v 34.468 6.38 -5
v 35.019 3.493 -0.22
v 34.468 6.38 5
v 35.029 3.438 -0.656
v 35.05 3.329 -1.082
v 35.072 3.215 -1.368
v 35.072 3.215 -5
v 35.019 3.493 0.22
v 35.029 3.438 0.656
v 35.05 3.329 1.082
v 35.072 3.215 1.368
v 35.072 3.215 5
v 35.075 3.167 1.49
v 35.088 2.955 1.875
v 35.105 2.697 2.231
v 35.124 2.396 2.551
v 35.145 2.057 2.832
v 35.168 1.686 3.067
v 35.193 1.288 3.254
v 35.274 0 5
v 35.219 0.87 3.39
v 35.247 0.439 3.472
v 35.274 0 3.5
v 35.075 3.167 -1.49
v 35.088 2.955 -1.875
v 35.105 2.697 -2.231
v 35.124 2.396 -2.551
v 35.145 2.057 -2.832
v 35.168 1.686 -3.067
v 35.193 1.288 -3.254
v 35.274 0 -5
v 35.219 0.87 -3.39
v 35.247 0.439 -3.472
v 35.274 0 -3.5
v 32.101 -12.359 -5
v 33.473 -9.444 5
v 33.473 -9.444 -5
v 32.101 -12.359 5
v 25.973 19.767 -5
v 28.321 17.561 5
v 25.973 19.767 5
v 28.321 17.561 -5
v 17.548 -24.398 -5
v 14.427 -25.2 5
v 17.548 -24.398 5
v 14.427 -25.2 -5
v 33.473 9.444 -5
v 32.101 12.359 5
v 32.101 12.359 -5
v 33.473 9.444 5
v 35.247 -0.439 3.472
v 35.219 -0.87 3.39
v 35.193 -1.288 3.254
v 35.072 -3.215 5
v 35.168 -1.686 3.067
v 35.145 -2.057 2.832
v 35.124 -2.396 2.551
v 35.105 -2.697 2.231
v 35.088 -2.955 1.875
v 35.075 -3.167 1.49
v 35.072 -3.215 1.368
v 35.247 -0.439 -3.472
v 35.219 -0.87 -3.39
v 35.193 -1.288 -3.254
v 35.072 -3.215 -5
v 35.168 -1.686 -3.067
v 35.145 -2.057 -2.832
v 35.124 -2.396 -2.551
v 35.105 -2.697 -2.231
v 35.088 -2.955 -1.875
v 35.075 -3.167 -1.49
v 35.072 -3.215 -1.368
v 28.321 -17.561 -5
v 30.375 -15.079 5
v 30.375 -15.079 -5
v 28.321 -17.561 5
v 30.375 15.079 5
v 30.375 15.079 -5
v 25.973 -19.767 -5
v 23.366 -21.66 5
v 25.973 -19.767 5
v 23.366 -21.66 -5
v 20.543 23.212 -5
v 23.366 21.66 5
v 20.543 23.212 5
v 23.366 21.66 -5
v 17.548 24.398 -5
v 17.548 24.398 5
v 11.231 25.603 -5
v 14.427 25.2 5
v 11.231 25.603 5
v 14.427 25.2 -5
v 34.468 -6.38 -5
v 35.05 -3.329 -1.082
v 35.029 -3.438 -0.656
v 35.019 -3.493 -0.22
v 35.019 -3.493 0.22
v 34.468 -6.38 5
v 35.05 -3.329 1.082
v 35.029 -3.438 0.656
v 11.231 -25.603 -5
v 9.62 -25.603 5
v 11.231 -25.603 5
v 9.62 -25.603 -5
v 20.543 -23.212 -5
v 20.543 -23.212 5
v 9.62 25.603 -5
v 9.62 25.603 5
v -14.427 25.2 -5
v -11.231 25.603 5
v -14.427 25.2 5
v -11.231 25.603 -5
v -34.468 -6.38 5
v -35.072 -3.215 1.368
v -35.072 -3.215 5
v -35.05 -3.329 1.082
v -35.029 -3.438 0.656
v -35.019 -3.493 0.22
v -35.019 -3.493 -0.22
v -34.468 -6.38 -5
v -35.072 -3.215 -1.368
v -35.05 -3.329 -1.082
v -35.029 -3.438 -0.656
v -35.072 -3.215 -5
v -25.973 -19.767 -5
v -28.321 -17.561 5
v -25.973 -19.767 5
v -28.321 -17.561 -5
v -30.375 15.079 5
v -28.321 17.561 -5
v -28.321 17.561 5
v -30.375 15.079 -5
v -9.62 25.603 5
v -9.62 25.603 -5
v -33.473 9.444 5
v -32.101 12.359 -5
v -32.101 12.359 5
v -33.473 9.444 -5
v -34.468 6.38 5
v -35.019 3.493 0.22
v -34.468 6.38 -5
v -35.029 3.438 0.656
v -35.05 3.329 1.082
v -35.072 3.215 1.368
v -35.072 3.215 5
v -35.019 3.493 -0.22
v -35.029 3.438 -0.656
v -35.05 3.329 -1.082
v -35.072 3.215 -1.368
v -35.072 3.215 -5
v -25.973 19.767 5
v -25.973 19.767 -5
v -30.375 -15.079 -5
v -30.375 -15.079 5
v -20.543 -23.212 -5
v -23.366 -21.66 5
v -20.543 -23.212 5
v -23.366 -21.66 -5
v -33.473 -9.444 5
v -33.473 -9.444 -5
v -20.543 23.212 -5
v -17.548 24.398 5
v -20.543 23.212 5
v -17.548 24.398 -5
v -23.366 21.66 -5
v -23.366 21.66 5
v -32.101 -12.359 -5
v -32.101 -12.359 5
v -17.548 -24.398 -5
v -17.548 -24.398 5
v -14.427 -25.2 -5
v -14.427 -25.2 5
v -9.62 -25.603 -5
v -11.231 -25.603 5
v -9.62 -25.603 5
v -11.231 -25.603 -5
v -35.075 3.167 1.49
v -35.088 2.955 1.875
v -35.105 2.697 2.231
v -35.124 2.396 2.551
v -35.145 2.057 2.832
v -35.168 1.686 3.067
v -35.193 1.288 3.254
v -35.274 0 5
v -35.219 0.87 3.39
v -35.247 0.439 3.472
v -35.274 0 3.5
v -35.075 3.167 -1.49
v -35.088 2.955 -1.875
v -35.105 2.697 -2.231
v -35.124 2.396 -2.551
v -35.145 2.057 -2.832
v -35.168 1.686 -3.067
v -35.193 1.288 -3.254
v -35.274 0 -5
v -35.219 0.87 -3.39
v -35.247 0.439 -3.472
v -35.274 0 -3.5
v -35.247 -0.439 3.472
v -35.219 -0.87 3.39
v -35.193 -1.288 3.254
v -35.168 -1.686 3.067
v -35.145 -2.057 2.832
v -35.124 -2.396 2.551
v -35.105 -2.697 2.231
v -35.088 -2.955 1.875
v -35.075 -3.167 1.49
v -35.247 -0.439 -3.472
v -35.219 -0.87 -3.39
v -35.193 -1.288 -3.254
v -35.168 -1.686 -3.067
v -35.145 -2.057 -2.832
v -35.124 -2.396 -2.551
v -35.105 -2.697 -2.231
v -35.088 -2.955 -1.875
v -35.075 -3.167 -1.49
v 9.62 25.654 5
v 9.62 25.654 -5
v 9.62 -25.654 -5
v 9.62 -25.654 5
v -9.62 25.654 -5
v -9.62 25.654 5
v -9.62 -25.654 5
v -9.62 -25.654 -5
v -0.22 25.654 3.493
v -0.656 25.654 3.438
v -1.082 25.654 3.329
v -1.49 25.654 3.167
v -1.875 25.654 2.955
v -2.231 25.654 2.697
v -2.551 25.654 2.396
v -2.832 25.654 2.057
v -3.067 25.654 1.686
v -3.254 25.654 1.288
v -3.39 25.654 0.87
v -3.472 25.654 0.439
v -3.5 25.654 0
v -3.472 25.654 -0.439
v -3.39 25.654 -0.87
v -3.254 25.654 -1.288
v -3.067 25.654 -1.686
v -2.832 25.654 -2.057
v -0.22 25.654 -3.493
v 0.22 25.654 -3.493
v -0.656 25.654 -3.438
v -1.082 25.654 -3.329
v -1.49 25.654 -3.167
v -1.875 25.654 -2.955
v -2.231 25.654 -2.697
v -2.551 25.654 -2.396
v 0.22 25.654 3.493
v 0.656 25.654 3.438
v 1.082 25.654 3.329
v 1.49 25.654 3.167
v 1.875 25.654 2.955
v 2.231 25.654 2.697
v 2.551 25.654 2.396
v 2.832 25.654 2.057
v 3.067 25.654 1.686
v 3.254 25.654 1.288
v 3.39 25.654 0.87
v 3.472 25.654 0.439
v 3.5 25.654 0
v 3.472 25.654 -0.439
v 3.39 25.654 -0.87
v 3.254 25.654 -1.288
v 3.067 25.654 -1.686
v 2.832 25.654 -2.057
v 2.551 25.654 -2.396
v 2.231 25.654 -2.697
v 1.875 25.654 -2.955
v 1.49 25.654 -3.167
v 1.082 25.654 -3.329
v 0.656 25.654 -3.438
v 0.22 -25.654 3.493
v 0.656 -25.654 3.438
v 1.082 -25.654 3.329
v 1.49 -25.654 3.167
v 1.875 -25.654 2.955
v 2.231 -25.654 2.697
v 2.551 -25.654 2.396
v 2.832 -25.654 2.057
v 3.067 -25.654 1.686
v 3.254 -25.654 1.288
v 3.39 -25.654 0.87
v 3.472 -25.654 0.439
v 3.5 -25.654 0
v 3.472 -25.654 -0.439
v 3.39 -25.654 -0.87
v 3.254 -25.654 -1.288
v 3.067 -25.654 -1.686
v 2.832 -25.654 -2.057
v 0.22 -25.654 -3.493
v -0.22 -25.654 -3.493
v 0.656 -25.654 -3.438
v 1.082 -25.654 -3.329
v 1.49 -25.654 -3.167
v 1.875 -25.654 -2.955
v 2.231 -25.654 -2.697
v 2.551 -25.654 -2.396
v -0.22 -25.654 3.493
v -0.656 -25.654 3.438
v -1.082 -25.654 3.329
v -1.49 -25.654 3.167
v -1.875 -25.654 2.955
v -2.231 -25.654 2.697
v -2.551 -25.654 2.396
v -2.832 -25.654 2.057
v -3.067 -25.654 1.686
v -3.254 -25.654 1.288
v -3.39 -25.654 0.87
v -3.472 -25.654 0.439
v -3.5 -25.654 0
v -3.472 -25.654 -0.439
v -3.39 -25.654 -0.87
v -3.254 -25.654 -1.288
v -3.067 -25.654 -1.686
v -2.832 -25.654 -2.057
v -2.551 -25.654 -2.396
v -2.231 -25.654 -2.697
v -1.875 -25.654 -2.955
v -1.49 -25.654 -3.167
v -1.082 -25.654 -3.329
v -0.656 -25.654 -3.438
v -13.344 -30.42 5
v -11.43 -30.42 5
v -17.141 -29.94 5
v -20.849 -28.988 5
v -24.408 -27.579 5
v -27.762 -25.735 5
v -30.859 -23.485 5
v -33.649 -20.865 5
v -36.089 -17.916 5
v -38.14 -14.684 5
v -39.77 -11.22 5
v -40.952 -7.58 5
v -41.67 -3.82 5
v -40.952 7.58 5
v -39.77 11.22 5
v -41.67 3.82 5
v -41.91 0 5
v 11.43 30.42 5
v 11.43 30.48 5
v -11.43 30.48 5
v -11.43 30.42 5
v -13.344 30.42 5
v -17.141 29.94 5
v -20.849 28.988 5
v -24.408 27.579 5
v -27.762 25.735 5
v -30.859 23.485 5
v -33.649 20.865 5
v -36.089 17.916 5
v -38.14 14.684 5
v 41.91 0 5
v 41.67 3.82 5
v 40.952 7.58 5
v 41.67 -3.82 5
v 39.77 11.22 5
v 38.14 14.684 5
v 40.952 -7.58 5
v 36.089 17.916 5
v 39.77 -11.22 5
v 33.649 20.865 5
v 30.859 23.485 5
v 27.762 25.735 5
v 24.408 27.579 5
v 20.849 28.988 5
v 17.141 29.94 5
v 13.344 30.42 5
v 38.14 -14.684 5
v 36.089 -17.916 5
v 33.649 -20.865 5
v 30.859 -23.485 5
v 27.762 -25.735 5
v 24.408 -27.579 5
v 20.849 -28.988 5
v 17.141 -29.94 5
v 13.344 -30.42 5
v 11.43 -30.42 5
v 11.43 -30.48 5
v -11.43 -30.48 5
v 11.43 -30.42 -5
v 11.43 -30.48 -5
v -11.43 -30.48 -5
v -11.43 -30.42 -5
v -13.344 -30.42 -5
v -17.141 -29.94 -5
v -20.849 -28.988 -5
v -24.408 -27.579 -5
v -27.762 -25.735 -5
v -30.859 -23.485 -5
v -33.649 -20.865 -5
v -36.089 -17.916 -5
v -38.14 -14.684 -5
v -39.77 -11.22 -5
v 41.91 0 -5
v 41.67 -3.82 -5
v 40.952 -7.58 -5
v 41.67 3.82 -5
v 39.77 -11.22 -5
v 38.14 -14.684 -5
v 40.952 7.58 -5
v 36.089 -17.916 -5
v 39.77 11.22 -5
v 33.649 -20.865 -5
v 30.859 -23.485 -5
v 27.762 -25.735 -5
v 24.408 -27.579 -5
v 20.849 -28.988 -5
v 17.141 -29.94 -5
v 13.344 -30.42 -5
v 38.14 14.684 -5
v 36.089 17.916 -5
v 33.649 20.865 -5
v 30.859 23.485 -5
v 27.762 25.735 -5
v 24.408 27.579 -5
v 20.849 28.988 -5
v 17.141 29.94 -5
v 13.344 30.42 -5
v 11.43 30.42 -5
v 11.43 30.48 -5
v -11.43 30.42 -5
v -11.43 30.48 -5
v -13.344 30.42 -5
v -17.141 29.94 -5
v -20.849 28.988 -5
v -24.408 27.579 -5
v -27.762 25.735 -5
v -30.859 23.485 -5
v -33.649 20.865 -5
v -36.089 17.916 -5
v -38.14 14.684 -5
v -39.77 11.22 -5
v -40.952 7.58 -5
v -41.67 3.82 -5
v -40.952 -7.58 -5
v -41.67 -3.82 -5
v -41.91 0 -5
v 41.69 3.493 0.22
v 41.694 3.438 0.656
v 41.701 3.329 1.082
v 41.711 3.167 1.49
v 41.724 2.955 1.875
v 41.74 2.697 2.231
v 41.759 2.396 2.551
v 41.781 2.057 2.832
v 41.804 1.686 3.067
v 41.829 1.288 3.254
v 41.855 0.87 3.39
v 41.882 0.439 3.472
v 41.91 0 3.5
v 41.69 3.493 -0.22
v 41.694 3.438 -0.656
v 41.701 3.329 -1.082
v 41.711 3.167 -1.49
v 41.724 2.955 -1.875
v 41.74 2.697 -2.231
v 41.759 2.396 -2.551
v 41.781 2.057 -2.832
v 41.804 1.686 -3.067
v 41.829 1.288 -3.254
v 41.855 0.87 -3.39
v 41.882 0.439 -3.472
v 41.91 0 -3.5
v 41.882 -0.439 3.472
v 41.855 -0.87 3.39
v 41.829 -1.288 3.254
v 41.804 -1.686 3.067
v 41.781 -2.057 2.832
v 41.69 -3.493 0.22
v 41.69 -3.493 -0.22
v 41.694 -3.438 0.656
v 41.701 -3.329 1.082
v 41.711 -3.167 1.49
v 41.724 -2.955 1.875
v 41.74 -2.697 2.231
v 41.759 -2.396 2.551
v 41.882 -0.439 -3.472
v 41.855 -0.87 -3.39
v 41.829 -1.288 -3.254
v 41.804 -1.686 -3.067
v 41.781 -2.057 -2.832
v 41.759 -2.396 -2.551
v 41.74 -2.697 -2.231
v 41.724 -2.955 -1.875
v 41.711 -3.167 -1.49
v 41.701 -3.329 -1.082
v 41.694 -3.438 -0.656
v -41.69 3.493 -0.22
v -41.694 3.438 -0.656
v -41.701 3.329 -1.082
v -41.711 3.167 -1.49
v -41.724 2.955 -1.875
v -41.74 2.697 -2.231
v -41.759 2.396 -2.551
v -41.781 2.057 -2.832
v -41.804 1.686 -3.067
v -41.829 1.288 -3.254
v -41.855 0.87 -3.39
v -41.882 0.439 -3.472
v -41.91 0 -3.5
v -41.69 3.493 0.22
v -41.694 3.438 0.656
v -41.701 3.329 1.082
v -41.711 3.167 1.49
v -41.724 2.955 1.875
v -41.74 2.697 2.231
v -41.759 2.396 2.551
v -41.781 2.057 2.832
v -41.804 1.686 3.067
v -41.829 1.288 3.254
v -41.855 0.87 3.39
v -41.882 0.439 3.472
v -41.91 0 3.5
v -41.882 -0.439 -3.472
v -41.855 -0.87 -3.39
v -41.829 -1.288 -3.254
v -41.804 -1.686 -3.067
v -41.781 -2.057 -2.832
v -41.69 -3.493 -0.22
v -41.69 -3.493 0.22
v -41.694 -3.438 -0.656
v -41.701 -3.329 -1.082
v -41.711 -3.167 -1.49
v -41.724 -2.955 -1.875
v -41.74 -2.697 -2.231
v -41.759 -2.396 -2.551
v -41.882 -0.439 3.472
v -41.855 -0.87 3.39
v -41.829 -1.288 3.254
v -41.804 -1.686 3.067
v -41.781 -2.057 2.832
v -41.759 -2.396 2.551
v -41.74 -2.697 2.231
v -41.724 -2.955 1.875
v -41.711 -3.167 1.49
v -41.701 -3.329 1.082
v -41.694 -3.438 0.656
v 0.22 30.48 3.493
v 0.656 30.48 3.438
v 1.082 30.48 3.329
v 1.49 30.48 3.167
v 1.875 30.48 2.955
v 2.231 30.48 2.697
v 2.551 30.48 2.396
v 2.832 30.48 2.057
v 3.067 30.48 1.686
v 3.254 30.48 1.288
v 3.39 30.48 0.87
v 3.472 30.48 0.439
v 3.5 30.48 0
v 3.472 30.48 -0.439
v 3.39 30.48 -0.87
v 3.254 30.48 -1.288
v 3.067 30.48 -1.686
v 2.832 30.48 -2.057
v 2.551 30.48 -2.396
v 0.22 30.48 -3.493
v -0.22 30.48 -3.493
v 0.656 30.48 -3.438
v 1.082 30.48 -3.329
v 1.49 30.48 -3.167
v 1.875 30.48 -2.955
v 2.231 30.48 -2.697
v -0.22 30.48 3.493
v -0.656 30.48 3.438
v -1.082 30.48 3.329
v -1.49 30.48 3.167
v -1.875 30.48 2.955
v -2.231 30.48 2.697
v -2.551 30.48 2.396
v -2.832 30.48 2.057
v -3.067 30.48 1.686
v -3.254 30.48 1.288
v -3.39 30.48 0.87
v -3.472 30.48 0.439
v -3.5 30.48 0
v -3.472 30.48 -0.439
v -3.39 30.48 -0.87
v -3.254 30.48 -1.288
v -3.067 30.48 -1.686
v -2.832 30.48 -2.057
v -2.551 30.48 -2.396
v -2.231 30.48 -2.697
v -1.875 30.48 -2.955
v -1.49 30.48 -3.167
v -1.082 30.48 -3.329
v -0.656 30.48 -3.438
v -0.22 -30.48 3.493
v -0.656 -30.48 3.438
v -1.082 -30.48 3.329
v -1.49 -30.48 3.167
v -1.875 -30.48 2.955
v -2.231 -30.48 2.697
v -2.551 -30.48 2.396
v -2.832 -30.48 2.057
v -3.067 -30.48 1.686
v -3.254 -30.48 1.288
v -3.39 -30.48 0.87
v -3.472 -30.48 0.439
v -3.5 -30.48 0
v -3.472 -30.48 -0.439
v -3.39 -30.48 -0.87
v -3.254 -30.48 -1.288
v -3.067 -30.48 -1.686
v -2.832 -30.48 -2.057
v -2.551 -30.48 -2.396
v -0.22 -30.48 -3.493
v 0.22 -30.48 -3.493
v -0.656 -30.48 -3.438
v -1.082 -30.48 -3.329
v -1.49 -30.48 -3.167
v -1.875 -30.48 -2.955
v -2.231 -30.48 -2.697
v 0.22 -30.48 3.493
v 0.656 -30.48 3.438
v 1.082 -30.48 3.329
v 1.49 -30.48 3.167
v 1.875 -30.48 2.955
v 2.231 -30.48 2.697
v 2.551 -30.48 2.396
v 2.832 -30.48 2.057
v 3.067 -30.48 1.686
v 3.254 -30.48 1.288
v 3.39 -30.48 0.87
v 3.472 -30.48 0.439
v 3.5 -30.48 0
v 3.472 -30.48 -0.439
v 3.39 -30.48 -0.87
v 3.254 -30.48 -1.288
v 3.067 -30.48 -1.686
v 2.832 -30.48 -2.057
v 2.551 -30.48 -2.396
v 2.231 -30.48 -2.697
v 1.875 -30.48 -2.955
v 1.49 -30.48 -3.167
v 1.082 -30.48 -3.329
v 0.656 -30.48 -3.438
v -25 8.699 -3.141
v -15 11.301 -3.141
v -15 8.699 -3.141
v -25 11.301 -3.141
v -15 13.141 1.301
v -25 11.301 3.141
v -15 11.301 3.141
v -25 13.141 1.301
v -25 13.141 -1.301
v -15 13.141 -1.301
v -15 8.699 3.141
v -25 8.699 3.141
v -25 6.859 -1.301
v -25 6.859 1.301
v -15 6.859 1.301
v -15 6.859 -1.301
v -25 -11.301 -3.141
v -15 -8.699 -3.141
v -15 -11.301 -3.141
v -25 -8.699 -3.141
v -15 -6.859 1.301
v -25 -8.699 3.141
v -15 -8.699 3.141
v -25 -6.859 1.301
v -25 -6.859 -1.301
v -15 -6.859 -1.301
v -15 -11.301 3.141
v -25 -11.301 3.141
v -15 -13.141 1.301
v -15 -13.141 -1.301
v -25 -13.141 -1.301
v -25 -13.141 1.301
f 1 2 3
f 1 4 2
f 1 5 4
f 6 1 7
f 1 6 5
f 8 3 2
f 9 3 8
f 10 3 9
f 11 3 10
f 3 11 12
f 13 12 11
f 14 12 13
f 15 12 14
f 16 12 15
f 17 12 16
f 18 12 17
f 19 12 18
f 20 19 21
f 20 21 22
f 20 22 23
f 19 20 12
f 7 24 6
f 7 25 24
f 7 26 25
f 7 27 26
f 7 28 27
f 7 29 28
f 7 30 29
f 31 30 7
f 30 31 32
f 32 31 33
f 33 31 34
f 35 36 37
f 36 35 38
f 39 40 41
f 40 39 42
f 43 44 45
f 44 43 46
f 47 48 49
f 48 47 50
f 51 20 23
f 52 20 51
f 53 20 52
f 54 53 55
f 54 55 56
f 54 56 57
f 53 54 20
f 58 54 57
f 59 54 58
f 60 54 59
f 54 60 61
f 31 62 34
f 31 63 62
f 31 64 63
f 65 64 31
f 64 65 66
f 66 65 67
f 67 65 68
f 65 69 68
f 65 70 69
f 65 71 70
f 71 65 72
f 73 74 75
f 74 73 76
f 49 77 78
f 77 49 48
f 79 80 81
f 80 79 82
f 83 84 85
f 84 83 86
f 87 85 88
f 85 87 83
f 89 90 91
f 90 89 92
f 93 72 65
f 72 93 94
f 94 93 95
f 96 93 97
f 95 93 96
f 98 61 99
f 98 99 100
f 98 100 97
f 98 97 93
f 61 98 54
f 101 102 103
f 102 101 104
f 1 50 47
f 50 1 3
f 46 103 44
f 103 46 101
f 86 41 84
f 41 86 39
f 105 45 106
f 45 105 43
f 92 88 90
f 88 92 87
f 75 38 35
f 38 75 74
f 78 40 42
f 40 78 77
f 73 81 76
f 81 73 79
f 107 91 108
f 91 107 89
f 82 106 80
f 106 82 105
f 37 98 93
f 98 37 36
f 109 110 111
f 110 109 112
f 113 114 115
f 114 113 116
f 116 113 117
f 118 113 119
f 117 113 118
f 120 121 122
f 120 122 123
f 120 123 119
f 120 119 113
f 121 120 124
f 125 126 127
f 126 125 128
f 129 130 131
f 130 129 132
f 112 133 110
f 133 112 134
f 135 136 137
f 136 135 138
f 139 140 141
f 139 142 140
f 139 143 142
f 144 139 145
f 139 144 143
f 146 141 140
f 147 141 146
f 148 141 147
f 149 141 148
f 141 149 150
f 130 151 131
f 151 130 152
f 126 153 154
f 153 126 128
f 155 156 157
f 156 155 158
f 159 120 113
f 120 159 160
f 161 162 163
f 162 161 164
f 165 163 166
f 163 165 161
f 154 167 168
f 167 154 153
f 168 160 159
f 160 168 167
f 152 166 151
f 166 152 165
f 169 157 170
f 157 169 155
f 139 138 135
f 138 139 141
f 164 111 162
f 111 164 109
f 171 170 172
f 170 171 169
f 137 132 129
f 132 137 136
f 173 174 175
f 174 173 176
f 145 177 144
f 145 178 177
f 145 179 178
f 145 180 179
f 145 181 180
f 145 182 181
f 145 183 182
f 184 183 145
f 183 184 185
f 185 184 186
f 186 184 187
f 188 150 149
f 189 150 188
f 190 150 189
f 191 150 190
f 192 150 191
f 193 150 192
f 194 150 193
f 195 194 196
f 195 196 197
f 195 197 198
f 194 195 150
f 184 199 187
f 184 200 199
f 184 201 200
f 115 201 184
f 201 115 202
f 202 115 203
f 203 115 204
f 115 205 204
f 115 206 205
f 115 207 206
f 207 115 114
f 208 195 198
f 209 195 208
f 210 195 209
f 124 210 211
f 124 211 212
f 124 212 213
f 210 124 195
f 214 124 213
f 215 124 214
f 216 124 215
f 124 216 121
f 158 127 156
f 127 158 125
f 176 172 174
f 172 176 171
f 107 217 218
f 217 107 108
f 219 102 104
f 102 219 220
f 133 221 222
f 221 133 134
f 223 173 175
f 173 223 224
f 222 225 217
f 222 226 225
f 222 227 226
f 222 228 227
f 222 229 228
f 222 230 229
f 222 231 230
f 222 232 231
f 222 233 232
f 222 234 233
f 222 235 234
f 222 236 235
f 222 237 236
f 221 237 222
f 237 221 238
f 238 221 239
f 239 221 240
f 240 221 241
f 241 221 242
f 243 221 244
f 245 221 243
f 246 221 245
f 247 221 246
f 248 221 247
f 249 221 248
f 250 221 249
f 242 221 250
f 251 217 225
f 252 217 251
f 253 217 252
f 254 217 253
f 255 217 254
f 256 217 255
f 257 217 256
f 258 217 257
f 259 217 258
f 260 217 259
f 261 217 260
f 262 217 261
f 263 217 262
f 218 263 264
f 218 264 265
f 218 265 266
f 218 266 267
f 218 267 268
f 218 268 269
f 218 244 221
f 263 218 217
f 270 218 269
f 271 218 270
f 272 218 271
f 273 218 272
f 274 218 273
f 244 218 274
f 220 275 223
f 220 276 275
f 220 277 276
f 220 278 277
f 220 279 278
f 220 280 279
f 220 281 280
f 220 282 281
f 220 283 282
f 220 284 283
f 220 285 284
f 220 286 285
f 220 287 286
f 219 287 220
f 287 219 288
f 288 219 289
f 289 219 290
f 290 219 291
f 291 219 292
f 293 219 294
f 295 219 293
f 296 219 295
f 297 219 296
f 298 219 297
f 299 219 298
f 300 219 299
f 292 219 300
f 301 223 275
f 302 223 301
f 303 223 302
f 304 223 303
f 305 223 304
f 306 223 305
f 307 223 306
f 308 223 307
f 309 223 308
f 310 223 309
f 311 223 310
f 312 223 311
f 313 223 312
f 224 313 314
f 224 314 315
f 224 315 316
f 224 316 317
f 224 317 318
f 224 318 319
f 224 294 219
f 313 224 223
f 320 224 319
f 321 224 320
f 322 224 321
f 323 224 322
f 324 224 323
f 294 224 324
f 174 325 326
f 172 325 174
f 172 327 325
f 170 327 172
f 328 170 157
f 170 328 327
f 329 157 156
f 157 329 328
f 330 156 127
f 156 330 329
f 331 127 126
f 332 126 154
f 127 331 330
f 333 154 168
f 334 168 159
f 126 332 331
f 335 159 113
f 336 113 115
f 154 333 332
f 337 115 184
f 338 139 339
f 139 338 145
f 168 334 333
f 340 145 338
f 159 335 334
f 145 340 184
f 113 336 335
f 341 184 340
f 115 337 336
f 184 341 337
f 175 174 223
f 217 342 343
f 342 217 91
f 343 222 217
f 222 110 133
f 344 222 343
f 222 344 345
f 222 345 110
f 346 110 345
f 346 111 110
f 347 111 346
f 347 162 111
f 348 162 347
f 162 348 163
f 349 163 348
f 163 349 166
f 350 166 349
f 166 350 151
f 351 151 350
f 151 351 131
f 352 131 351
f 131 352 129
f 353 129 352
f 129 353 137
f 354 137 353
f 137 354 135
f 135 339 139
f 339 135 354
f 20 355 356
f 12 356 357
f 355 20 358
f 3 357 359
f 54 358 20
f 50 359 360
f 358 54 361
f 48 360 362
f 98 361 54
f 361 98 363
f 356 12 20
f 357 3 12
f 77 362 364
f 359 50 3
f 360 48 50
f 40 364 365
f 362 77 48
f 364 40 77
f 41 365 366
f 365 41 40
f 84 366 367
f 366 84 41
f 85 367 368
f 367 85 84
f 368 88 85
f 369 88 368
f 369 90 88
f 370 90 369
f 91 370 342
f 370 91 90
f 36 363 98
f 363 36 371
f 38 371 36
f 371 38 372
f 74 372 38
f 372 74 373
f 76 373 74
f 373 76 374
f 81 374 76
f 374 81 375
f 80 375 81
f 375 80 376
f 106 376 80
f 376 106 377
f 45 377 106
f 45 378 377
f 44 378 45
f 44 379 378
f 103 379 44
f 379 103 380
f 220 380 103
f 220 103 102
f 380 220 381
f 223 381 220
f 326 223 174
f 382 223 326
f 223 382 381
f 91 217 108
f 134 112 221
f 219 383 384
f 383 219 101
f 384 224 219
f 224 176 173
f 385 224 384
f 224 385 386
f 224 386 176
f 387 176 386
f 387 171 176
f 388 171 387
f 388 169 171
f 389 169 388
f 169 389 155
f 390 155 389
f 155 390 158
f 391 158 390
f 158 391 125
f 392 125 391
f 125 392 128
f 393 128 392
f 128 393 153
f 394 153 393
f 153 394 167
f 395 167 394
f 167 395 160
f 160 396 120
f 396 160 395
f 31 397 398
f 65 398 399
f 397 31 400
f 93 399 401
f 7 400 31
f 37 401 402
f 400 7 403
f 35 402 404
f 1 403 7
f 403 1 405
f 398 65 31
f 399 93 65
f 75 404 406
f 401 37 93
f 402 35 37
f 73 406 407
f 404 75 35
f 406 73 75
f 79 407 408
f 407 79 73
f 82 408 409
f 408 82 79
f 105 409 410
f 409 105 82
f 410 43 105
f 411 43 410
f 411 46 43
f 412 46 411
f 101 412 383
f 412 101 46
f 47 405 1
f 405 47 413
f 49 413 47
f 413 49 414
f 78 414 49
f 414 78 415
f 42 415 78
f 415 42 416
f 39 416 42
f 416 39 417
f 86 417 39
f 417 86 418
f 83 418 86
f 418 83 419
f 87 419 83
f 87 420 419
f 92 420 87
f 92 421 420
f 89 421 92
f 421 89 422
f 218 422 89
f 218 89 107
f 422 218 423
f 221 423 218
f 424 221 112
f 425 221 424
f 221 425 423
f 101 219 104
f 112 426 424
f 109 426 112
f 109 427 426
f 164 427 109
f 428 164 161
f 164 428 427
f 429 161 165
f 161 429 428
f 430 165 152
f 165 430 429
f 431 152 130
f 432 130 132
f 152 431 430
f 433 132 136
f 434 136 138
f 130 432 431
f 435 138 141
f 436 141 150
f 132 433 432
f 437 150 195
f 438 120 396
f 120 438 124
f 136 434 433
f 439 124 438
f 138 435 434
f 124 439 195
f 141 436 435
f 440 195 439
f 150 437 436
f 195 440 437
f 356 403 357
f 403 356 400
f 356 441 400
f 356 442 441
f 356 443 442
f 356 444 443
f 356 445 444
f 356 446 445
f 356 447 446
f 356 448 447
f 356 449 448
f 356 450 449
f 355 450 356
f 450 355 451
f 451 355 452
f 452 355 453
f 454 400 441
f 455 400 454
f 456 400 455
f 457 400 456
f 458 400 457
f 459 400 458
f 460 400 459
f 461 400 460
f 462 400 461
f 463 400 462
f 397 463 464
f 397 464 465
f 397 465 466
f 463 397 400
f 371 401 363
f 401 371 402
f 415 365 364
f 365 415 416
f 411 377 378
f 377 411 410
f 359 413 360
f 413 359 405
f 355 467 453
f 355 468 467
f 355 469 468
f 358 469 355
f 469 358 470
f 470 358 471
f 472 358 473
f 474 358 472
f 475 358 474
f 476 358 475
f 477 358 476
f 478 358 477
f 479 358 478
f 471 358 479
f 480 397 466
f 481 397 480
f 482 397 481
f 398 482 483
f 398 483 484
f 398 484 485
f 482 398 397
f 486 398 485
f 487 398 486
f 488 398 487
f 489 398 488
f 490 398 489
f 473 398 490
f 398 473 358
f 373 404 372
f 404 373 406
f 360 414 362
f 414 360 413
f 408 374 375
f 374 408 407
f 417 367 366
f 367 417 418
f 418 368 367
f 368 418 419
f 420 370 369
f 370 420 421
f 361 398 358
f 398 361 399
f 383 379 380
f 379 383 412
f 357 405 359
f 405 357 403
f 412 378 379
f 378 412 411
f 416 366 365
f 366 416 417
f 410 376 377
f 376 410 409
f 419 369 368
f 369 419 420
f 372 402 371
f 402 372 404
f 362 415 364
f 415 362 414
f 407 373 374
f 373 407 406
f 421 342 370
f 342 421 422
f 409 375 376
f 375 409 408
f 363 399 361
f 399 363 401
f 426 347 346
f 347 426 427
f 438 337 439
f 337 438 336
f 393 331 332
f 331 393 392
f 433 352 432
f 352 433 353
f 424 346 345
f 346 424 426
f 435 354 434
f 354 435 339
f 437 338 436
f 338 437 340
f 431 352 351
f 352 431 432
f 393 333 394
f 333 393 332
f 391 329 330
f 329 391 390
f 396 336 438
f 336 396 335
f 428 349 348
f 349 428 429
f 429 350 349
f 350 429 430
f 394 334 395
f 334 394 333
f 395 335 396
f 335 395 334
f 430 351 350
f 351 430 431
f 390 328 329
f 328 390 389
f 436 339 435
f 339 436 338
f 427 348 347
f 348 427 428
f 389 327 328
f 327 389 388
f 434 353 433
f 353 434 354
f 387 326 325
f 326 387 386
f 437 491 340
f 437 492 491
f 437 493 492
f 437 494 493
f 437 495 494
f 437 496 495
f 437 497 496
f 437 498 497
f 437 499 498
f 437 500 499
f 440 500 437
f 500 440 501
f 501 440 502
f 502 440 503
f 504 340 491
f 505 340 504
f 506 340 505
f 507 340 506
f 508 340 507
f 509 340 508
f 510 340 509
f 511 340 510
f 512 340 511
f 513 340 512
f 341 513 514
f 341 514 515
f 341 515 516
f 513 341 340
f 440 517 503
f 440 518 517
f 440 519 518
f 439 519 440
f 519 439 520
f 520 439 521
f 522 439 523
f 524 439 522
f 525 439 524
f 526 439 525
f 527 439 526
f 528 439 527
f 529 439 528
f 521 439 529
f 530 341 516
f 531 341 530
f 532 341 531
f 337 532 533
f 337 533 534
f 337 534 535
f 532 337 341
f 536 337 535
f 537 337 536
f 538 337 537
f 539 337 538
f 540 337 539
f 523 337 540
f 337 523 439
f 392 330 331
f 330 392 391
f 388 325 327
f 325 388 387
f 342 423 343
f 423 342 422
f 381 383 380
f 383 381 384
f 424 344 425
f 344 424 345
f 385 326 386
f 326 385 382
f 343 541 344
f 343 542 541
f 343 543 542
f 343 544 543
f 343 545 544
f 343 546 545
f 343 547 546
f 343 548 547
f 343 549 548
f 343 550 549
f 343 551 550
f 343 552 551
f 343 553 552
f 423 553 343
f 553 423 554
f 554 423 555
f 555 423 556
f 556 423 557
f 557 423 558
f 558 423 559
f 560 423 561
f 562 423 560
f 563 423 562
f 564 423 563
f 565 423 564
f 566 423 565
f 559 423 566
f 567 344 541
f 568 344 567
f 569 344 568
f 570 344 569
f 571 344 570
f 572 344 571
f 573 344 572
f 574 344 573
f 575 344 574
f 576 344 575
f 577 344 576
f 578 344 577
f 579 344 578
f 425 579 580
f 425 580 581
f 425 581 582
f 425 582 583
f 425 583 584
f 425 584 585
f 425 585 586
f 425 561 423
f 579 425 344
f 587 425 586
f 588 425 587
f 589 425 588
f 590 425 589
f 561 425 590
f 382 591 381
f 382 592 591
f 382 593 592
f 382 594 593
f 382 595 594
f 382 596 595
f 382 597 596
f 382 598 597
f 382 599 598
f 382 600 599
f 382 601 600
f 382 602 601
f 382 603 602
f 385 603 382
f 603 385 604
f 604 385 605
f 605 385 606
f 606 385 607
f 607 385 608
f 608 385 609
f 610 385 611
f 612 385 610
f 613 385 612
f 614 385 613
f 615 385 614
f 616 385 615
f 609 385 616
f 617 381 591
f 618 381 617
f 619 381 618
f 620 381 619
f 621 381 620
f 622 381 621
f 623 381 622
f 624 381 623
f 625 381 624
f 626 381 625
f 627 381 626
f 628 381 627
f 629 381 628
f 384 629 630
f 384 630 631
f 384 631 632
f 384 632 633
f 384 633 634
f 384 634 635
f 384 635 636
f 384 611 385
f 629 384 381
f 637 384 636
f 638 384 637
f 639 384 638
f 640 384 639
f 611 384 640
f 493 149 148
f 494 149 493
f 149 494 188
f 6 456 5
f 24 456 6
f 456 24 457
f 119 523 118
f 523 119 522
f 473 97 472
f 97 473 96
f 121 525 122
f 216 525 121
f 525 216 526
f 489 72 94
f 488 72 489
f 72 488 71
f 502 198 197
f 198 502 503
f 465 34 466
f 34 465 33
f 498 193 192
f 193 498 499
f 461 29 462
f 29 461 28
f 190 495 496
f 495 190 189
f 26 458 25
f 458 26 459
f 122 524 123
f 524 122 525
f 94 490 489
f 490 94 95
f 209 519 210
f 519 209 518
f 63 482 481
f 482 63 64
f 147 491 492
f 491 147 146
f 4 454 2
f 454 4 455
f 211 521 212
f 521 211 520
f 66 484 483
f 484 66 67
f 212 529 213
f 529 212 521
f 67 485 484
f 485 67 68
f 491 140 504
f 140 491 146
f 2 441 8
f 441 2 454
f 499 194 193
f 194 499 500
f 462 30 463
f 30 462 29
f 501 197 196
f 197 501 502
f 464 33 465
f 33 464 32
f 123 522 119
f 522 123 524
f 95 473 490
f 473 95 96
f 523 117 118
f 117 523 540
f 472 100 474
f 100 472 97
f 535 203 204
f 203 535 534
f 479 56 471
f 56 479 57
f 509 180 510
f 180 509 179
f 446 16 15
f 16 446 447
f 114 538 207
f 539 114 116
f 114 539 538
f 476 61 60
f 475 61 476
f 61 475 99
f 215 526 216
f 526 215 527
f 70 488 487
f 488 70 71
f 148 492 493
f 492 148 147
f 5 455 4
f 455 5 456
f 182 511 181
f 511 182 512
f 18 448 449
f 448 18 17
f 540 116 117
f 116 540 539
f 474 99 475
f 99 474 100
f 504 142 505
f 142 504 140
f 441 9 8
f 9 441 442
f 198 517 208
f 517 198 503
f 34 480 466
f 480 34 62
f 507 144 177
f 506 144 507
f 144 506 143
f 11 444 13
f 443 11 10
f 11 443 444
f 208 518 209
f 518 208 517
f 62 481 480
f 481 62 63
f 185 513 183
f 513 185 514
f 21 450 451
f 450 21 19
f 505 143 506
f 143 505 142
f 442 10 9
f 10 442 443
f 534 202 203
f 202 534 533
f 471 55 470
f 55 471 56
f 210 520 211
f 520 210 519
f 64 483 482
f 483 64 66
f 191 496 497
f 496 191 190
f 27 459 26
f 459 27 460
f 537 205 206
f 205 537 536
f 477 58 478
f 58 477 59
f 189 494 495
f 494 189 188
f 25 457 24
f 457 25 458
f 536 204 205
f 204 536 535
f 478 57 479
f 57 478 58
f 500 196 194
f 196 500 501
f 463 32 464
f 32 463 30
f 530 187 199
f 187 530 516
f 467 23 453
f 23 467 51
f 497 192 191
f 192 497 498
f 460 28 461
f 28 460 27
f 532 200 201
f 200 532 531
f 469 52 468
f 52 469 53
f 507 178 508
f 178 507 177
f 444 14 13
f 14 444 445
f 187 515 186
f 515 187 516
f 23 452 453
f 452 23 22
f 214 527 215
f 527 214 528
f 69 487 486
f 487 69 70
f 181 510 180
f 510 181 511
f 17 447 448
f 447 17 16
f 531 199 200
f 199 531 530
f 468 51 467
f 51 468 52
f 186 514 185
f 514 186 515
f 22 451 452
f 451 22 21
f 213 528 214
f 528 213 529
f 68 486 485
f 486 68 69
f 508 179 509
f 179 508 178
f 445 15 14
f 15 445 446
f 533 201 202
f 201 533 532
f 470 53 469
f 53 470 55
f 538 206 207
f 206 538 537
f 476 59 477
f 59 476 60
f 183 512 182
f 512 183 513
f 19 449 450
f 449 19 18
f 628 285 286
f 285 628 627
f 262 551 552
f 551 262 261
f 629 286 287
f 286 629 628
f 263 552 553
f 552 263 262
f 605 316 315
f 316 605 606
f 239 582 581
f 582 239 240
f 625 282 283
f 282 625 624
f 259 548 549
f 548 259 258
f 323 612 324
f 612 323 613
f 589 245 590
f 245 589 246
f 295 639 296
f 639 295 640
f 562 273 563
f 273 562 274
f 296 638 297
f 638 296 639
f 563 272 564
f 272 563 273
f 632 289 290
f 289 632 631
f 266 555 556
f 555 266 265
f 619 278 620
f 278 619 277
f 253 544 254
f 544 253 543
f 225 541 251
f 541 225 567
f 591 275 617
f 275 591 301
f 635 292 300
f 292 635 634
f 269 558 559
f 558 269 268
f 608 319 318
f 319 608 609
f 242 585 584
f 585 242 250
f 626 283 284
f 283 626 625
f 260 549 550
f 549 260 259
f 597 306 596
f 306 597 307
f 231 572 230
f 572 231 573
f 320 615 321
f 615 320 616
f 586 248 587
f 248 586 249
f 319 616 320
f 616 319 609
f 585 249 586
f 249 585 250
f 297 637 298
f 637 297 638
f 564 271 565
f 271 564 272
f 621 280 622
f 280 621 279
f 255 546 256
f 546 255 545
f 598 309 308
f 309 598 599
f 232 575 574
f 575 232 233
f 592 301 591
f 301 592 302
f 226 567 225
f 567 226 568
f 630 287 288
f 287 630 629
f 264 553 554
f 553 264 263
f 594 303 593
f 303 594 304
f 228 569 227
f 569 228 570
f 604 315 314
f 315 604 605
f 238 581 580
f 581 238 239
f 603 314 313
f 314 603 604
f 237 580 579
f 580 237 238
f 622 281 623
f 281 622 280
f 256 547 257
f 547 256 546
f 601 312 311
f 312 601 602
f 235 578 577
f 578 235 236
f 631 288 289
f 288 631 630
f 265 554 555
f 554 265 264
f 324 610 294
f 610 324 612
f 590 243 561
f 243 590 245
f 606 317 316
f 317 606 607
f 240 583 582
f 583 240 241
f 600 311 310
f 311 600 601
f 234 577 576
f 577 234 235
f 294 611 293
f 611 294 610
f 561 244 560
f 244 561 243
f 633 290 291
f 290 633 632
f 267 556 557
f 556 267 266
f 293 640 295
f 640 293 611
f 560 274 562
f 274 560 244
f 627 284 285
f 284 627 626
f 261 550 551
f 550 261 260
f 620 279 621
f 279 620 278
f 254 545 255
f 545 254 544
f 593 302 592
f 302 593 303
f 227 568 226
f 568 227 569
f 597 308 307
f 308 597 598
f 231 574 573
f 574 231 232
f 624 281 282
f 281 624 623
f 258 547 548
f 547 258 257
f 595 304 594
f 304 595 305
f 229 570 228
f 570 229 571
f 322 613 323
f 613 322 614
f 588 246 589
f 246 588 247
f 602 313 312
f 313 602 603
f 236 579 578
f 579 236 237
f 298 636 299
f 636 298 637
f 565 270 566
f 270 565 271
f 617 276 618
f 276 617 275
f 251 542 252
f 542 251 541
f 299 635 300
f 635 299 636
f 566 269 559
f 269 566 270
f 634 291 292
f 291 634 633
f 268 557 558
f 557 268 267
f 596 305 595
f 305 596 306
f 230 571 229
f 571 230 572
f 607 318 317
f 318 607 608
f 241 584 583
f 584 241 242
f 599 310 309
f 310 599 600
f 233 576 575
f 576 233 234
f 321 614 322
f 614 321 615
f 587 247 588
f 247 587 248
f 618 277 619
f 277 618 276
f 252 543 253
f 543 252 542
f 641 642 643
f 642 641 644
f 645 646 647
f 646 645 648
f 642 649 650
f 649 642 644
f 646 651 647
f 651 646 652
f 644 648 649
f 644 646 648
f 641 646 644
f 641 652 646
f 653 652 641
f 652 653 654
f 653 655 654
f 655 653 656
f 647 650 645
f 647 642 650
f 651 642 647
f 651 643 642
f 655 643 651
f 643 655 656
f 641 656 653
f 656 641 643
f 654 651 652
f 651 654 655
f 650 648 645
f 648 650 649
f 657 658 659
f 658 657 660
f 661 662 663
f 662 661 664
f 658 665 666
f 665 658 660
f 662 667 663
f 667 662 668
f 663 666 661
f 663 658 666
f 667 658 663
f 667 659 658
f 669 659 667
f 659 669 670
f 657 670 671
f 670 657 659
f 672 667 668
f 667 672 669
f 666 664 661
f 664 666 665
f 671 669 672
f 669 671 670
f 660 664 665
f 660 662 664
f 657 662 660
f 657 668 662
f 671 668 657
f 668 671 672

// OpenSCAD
/* [PEGS] */
numberPegs = 2; //[0, 1, 2, 3, 4]

// Container is exactly: 2.0" x 2.75"

difference()
{
 ring();
 holes();
}

if (numberPegs > 3)
{ 
    translate([20, 10, 0]) peg();
}
if (numberPegs > 2)
{ 
    translate([20, -10, 0]) peg();
}
if (numberPegs > 1)
{ 
    translate([-20, 10, 0]) peg();
}
if (numberPegs > 0)
{ 
    translate([-20, -10, 0]) peg();
}


module baseCylinder()
{
    cylinder(d=mm(2), h=20, center=true, $fn=50);
}

module container()
{
 translate([mm(.75/2),0,0]) baseCylinder();
 translate([-mm(.75/2),0,0]) baseCylinder();
 cube([mm(0.75), mm(2), 20], center=true);    
}

module ring()
{
intersection()
{
 difference()
 {
  cube([mm(3.5),mm(2.5),10], center=true);
  // slight upscale needed for tolerance. Increase for looser fit, decrease for tighter fit
  scale([1.01,1.01,1]) container();
 }
  // sets the thickness of the ring
  scale([1.2,1.2,1.1]) container(); 
}
}

module holes()
{
 rotate ([0,90,0]) hole();
 rotate ([90,0,0]) hole();  
}

module hole()
{
    cylinder(d=7, h=300, $fn=50, center=true);    
}

module peg()
{
  rotate([22.5,0,0]) rotate ([0,90,0]) cylinder(d=6.8, h=10, $fn=8, center=true);  
}


// converts x from inches to mm
function mm(x) = 25.4*x;
